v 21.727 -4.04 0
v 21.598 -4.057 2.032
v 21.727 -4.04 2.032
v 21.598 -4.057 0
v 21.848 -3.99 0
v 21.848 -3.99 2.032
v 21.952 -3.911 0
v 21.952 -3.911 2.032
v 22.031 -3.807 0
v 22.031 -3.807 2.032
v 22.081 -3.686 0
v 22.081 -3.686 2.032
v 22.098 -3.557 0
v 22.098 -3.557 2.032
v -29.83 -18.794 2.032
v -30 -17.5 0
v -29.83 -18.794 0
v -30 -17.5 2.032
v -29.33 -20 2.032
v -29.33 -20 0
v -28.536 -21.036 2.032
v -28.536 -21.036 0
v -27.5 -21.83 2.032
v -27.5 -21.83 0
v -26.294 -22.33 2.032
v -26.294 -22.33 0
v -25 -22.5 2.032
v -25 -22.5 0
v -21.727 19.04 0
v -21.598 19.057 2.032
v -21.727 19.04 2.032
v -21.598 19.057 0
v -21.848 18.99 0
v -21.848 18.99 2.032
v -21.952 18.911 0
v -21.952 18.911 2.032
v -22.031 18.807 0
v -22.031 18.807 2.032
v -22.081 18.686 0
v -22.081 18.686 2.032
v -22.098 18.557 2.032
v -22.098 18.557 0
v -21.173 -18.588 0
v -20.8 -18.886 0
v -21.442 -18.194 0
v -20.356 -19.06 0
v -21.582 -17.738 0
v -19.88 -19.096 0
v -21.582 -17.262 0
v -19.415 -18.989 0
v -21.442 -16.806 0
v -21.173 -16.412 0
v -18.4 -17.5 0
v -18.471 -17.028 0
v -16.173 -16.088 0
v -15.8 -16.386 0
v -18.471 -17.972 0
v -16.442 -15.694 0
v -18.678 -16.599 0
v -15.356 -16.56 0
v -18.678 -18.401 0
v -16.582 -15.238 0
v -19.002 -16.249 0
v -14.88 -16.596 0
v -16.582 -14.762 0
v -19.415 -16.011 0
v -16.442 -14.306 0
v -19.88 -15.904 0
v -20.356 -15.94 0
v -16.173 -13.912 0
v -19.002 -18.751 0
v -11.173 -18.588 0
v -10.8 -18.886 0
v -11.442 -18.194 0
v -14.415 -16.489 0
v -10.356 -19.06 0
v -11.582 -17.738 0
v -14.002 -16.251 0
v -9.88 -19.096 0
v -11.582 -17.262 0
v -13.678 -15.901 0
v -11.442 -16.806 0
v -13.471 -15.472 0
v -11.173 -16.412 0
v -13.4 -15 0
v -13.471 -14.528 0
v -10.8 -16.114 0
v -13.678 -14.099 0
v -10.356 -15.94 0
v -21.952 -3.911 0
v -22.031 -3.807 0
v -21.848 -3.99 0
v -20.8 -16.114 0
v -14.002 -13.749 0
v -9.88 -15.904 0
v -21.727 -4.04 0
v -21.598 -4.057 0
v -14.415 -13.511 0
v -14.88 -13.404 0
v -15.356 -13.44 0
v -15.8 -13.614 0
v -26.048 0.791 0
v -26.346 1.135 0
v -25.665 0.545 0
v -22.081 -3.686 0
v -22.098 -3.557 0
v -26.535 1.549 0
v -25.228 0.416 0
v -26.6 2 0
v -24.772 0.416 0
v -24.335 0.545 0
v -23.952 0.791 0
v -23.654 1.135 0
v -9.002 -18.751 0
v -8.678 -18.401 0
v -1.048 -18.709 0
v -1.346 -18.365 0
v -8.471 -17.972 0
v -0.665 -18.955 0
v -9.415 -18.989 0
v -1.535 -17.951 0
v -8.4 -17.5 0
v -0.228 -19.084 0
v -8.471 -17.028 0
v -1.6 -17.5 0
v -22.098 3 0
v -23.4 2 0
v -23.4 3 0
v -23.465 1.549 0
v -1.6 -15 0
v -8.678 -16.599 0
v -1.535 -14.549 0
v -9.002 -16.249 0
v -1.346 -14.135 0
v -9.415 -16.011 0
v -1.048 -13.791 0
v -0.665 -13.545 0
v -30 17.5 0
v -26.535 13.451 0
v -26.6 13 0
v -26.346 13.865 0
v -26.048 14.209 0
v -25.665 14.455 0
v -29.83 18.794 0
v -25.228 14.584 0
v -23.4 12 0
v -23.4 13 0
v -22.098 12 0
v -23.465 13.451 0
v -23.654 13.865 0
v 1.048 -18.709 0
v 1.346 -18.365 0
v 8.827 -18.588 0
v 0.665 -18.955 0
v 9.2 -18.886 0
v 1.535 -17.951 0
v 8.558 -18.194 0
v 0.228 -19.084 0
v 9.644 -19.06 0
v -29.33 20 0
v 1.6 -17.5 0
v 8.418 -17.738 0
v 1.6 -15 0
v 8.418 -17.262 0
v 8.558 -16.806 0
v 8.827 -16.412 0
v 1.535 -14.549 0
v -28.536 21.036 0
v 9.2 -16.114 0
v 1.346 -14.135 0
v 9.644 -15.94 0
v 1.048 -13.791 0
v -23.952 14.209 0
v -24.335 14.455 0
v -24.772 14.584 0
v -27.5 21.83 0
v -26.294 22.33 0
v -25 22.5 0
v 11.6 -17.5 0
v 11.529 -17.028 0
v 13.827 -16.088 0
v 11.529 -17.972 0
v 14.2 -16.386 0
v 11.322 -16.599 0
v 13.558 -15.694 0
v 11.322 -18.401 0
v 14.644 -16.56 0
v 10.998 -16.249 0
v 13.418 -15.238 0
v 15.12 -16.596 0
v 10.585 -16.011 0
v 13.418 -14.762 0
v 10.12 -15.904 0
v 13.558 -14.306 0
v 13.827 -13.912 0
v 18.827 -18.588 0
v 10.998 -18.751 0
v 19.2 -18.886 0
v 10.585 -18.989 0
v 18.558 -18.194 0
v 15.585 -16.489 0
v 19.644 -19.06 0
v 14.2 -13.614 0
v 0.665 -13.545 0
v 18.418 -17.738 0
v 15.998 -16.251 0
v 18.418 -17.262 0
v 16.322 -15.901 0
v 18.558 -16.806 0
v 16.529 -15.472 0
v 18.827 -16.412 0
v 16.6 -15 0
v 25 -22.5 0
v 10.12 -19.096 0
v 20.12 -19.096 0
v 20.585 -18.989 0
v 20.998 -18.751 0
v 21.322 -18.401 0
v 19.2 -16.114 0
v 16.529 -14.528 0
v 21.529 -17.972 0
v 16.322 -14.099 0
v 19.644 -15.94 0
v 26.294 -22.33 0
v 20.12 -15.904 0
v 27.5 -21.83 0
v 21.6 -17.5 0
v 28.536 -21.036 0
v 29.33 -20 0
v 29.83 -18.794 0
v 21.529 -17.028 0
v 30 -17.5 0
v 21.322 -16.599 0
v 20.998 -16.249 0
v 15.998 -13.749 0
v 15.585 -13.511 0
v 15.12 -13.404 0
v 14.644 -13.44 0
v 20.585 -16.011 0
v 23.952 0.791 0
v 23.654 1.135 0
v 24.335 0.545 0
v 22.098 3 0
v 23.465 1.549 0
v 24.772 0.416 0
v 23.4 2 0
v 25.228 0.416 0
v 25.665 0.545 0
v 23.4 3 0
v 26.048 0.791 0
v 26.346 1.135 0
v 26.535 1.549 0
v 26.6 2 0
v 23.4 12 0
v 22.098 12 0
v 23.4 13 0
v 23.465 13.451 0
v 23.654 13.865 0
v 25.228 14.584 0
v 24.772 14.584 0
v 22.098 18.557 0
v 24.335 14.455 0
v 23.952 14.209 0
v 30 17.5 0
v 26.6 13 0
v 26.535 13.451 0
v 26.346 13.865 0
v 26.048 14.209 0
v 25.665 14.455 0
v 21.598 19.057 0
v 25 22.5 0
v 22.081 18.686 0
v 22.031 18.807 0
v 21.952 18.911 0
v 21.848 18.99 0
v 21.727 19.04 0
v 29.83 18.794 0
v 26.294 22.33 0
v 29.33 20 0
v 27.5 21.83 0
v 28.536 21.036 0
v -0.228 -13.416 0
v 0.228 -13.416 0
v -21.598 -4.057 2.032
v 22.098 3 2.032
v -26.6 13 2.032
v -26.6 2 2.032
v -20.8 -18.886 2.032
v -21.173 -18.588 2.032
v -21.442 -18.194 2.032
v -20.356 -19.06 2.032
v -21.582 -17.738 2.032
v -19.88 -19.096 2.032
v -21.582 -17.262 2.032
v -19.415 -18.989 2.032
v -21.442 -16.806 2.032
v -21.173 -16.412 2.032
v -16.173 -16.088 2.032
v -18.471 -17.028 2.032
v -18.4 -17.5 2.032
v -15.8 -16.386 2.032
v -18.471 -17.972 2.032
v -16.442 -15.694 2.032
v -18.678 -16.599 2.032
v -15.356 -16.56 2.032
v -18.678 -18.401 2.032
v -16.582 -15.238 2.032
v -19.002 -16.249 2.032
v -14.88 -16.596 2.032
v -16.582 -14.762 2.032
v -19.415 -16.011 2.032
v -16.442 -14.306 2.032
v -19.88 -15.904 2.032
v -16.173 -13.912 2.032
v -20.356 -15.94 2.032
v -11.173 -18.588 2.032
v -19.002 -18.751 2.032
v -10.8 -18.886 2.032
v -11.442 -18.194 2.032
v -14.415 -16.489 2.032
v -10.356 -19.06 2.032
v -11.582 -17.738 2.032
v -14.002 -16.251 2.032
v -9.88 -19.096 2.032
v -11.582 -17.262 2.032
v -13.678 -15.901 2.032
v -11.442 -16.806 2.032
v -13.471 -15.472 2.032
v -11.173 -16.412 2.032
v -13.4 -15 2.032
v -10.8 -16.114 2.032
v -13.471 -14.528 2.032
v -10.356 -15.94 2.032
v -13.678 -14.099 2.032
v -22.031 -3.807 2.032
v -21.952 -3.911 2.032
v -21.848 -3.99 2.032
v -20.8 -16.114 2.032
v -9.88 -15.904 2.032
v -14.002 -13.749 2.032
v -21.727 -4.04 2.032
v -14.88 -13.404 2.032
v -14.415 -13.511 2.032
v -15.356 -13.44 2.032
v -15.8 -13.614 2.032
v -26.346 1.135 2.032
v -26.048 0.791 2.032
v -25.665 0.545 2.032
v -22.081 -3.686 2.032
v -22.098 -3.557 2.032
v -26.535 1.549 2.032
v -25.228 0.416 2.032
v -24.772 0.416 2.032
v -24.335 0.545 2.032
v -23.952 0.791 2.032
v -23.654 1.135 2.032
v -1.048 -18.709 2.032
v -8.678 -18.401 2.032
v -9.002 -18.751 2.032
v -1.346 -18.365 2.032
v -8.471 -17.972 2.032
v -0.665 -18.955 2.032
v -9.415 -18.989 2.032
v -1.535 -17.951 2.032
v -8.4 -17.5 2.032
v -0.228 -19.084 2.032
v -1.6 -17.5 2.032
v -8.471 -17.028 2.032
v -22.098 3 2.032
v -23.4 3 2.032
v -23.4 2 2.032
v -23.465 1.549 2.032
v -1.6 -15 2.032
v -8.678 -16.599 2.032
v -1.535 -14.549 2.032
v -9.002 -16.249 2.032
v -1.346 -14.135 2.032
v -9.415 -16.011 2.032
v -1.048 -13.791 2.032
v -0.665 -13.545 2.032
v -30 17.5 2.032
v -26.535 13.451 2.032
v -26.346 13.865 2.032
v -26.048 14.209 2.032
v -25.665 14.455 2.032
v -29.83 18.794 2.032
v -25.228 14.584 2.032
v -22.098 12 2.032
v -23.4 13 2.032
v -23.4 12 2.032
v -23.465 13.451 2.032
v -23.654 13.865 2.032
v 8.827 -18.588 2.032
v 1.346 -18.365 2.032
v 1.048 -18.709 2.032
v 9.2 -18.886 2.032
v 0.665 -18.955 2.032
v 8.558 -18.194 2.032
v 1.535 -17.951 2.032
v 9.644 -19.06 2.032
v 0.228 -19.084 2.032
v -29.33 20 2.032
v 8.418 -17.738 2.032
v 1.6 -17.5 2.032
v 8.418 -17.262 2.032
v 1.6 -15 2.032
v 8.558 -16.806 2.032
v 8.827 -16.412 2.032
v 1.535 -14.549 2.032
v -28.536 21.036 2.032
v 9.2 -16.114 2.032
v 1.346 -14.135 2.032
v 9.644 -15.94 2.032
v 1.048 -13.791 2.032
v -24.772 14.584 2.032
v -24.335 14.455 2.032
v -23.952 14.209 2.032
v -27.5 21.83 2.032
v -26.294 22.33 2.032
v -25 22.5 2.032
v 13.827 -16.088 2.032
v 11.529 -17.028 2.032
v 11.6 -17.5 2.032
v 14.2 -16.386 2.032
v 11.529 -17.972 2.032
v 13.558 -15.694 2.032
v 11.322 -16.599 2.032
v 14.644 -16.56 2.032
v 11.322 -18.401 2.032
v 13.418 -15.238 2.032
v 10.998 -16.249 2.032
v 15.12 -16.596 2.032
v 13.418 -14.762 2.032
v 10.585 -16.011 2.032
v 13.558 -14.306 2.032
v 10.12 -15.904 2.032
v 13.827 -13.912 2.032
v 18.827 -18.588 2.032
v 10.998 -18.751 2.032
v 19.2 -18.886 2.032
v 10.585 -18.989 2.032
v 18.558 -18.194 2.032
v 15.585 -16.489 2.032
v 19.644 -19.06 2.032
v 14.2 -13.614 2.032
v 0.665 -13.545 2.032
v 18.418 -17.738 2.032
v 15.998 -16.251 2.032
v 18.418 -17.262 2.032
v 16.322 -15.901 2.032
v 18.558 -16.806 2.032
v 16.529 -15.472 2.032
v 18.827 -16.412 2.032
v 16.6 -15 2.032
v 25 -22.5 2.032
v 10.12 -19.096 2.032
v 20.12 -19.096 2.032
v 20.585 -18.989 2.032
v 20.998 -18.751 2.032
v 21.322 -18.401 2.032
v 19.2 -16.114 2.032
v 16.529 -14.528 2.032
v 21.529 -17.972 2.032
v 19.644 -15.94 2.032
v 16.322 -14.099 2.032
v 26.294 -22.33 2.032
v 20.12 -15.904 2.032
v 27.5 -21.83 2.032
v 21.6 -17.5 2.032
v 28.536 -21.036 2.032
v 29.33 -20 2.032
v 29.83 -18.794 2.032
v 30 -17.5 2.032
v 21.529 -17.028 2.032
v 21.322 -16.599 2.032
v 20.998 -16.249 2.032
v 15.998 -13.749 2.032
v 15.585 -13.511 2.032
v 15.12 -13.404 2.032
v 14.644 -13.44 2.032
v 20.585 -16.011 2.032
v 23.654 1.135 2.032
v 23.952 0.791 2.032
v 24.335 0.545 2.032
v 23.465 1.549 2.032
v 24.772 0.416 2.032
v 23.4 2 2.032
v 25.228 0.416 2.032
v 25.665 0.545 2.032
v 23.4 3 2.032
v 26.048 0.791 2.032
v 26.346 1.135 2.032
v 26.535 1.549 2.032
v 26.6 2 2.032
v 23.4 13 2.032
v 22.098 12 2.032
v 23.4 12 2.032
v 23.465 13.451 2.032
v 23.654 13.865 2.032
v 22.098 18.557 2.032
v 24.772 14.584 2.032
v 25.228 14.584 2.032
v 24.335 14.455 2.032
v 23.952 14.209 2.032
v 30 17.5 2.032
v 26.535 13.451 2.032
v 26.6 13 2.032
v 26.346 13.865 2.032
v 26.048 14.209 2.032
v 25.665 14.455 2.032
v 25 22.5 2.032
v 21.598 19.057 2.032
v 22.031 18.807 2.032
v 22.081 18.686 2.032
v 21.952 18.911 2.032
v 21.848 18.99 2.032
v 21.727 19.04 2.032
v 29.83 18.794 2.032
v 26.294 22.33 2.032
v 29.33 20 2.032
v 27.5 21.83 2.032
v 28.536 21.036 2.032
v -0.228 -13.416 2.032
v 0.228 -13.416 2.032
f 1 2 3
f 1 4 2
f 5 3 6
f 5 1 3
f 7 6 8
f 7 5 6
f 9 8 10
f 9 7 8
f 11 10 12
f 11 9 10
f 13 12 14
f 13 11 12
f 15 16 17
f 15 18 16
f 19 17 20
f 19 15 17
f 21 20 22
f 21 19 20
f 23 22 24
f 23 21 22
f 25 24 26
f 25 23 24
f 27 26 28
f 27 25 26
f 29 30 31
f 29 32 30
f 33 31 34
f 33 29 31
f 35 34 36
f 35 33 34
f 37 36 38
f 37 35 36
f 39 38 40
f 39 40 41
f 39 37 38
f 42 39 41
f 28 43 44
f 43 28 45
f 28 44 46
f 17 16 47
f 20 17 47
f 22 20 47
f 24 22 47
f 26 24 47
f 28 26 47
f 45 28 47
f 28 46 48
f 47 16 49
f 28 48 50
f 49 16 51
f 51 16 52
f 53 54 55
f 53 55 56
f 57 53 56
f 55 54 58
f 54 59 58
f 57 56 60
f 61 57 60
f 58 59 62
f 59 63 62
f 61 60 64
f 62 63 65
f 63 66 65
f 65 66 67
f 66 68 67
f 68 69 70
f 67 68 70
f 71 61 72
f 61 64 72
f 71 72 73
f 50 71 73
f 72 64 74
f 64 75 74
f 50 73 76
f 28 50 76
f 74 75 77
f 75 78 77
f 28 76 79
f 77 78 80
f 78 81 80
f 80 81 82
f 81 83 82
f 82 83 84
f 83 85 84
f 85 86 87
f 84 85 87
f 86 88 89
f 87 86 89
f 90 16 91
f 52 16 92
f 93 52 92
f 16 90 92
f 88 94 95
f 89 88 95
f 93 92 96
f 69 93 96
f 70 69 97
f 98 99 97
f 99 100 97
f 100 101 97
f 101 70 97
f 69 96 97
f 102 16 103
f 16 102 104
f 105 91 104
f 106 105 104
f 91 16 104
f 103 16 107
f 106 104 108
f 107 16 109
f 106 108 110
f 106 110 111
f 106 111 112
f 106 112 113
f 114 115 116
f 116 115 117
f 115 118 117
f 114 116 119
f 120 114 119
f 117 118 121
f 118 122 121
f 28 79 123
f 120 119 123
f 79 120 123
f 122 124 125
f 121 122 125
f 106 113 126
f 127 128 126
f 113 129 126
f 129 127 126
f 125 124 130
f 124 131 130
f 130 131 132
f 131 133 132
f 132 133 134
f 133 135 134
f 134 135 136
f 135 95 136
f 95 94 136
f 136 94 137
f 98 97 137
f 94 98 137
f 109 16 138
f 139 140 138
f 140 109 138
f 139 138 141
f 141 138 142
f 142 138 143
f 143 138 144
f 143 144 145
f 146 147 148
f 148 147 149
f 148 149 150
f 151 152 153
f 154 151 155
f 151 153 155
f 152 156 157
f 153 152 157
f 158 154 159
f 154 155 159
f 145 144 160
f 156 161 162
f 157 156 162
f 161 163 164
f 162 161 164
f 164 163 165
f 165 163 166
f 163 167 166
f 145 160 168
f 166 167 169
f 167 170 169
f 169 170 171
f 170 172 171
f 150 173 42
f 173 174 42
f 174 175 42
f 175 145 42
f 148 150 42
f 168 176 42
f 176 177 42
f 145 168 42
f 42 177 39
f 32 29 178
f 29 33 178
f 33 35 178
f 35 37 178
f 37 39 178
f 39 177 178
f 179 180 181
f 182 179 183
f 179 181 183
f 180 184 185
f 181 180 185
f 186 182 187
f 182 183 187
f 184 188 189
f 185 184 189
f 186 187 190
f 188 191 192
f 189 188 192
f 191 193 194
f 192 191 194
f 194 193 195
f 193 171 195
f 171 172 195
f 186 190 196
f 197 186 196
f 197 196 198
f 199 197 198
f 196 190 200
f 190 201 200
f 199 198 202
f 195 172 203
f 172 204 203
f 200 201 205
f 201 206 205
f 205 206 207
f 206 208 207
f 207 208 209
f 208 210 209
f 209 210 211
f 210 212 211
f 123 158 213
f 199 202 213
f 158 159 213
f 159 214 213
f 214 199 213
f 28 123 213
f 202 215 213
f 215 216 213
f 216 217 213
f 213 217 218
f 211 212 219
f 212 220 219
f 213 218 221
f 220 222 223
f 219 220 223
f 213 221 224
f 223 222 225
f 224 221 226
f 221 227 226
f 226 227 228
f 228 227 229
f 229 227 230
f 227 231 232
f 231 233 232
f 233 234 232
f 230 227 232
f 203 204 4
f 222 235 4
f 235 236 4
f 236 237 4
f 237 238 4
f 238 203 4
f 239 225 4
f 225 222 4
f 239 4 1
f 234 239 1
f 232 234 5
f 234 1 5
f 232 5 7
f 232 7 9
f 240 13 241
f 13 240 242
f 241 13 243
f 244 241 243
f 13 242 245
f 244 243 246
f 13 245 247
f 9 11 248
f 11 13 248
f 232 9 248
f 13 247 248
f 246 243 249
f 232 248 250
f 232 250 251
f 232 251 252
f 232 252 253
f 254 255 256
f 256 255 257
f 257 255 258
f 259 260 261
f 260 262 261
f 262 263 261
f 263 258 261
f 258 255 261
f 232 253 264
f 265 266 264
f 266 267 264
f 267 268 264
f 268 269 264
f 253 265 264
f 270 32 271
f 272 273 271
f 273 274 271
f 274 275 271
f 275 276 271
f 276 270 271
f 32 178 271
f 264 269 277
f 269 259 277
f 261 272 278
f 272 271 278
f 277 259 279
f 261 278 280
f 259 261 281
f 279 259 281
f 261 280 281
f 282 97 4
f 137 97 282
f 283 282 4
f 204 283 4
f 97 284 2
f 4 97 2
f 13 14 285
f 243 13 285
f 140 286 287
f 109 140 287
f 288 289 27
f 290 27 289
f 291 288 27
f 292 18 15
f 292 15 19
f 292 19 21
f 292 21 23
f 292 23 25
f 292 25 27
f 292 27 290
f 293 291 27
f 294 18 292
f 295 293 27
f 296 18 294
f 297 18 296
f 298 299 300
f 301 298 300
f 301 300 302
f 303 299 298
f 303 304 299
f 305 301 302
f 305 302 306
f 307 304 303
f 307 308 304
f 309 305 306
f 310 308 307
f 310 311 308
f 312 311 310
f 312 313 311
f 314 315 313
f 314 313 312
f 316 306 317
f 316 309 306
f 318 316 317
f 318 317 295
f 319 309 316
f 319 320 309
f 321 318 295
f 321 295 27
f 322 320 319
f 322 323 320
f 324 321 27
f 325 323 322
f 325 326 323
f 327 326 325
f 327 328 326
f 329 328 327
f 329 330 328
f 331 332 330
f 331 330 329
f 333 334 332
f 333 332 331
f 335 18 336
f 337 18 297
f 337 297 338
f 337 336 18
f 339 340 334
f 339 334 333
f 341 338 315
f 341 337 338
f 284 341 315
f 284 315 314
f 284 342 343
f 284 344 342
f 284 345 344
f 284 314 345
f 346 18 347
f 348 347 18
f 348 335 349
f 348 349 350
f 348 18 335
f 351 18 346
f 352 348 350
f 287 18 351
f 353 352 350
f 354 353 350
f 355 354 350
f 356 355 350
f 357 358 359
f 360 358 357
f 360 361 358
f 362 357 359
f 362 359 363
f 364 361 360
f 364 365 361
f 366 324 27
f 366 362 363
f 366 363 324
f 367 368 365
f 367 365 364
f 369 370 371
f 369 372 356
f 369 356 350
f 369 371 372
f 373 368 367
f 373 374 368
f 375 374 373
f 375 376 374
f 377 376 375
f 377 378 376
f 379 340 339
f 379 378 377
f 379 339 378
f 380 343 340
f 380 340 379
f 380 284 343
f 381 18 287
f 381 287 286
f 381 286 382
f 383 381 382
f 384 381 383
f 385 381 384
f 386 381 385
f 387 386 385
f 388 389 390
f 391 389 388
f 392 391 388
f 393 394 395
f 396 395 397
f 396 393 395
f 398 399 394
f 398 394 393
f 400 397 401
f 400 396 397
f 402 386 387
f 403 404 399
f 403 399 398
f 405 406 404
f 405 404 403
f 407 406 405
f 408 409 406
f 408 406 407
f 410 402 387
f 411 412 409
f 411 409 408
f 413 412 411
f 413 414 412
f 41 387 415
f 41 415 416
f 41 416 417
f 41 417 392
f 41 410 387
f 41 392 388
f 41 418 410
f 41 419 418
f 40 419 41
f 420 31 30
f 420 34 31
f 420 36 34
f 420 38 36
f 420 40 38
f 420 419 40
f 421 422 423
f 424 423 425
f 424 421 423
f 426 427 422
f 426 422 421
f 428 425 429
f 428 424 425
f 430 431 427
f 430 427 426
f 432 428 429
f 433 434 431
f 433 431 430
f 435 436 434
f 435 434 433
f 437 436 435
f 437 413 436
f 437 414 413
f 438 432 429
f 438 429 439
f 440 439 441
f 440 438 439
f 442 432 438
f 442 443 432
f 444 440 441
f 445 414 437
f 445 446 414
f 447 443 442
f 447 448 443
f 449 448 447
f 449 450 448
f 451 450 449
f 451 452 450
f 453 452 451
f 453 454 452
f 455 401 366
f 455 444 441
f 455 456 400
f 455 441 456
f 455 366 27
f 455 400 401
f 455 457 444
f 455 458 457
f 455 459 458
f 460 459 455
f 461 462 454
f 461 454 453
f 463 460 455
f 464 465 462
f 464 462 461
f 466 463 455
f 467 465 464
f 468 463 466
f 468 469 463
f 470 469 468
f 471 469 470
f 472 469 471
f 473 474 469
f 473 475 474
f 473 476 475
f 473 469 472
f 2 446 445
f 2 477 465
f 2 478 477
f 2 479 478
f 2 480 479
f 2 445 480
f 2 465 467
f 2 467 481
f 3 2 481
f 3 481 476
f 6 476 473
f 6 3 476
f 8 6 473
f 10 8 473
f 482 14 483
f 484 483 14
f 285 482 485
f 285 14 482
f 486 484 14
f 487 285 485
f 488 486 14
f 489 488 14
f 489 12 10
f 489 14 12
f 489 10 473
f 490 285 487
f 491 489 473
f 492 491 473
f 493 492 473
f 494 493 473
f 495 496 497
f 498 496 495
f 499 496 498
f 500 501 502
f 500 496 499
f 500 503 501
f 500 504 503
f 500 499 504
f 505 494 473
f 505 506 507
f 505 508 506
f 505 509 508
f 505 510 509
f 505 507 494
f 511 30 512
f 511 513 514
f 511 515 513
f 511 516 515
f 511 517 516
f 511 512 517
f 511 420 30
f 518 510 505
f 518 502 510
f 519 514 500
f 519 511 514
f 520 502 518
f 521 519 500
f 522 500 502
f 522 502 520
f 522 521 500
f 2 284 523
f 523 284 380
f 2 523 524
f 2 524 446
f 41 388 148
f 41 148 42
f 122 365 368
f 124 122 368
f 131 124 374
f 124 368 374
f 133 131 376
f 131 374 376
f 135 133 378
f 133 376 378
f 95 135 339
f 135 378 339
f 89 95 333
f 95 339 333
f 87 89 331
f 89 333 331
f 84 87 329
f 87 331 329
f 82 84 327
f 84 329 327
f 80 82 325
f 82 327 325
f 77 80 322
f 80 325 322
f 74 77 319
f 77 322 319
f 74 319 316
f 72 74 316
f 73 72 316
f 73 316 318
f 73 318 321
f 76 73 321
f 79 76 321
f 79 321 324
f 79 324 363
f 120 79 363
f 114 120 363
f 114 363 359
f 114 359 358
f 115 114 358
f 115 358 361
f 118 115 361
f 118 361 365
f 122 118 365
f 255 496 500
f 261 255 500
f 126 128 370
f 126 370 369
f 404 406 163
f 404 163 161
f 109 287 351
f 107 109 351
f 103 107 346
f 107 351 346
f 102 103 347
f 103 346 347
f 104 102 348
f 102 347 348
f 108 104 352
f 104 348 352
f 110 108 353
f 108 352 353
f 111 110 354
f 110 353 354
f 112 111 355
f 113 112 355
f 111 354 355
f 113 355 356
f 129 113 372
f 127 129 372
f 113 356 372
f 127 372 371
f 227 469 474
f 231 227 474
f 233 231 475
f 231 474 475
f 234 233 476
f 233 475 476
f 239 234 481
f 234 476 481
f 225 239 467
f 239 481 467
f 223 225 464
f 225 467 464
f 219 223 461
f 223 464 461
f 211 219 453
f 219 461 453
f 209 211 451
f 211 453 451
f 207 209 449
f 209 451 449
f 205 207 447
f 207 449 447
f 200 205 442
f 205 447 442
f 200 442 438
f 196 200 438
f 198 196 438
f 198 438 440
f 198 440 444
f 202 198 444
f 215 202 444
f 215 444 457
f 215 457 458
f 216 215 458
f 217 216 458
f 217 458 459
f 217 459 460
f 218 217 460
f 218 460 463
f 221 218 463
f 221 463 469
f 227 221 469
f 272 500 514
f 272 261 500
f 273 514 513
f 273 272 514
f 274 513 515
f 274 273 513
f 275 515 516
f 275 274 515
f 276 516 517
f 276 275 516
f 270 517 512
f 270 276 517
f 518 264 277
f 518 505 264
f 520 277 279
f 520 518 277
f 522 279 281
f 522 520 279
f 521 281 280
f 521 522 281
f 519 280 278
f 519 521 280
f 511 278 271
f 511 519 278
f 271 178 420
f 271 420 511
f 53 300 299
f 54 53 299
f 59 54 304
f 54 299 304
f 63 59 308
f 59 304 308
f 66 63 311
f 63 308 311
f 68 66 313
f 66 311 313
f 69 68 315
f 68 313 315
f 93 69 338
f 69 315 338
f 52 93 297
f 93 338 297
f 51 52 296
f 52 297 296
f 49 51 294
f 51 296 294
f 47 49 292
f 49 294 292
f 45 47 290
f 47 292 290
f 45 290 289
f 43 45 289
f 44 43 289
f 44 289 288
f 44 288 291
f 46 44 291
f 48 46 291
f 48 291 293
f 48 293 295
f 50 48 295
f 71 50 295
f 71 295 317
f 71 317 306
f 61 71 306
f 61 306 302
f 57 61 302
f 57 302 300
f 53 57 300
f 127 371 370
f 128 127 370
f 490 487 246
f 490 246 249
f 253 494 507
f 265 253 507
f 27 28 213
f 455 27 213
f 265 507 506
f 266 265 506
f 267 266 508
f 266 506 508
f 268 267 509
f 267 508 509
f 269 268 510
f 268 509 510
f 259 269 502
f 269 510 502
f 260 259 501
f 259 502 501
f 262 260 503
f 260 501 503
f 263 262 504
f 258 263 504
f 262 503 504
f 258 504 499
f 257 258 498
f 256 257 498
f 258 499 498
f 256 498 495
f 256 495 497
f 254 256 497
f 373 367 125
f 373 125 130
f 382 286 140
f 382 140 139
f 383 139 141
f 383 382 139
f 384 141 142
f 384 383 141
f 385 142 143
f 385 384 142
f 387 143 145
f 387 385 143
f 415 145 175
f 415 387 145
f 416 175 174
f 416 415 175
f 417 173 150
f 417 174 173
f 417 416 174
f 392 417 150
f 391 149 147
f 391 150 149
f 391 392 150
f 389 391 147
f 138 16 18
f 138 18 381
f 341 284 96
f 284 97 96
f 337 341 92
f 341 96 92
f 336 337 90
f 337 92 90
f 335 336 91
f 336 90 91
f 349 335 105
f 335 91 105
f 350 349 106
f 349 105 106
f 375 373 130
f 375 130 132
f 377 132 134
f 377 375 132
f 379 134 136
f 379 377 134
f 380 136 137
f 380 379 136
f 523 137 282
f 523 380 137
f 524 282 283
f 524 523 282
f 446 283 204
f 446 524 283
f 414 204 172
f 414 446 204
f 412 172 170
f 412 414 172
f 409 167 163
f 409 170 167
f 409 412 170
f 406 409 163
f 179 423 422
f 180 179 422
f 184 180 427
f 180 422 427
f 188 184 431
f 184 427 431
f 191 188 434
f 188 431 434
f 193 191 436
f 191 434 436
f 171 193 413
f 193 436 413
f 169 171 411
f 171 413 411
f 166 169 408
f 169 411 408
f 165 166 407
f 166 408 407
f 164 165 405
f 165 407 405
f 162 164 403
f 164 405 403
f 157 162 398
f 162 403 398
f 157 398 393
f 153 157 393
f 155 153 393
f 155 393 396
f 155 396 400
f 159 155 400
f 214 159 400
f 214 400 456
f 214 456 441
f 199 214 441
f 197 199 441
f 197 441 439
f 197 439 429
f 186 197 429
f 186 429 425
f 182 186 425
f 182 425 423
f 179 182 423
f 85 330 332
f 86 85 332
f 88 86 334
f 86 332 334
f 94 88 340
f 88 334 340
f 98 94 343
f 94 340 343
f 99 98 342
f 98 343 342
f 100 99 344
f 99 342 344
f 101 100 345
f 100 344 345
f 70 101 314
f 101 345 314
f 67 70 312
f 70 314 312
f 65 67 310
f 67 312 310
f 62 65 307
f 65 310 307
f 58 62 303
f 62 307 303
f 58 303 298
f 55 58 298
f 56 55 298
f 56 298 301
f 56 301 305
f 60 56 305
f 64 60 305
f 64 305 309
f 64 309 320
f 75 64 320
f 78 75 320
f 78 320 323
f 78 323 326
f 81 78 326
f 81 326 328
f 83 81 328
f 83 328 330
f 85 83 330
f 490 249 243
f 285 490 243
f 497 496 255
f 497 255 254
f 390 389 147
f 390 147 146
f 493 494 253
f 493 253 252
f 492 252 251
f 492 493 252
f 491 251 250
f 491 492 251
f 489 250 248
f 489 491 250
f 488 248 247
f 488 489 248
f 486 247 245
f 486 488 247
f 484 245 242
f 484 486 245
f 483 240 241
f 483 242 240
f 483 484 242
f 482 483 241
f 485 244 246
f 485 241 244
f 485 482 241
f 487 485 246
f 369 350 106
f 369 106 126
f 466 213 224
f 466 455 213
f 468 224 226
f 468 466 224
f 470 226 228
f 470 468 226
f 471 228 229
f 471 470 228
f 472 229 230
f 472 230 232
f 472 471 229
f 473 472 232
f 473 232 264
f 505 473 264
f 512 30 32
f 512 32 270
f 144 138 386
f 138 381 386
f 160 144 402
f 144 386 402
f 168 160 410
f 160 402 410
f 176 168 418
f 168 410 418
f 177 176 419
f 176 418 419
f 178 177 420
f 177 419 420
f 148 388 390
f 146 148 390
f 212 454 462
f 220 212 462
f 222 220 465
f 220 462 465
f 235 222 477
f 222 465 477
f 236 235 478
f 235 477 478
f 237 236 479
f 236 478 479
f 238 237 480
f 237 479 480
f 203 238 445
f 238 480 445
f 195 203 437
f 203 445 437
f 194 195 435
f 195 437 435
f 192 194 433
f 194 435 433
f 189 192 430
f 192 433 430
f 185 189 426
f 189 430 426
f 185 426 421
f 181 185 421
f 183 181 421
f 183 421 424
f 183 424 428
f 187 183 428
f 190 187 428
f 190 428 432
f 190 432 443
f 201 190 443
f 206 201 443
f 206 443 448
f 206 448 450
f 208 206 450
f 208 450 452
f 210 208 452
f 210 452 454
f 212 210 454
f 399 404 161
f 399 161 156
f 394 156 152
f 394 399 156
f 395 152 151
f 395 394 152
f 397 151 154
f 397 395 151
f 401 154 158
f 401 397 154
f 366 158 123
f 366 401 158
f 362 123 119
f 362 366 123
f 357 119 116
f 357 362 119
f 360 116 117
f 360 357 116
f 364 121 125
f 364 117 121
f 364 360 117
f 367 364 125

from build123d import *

# Parameters (mm, degrees)
SKETCH1_W           = 60
SKETCH1_H           = 45
BOSS_EXTRUDE1_DEPTH = 2.032
FILLET1_R           = 5
SKETCH2_W           = 44.196
SKETCH2_H           = 23.114
CUT_EXTRUDE1_DEPTH  = 3.032
FILLET2_R           = 0.5
CUT_EXTRUDE2_DEPTH  = 3.032
SKETCH4_R           = 1.6
CUT_EXTRUDE3_DEPTH  = 3.032


with BuildPart() as part:
    # Sketch1 → Boss-Extrude1 (new body)
    with BuildSketch(Plane.XY):
        Rectangle(SKETCH1_W, SKETCH1_H)
    extrude(amount=BOSS_EXTRUDE1_DEPTH)

    # Fillet1
    fillet1_edges = [part.edges().sort_by_distance(p)[0] for p in [
        (30, -22.5, 1.016),
        (-30, -22.5, 1.016),
        (-30, 22.5, 1.016),
        (30, 22.5, 1.016),
    ]]
    fillet(fillet1_edges, radius=FILLET1_R)

    # Sketch2 → Cut-Extrude1 (cut, through all)
    with BuildSketch(Plane.XY.offset(2.032)):
        with Locations((0, 7.5)):
            Rectangle(SKETCH2_W, SKETCH2_H)
    extrude(amount=-CUT_EXTRUDE1_DEPTH, mode=Mode.SUBTRACT)

    # Fillet2
    fillet2_edges = [part.edges().sort_by_distance(p)[0] for p in [
        (22.098, 19.057, 1.016),
        (22.098, -4.057, 1.016),
        (-22.098, -4.057, 1.016),
        (-22.098, 19.057, 1.016),
    ]]
    fillet(fillet2_edges, radius=FILLET2_R)

    # Sketch3 → Cut-Extrude2 (cut, through all)
    with BuildSketch(Plane.XY.offset(2.032)):
        with BuildLine():
            ThreePointArc((-26.6, 13), (-25, 14.6), (-23.4, 13))
            Line((-23.4, 13), (-23.4, 12))
            ThreePointArc((-23.4, 12), (-25, 10.4), (-26.6, 12))
            Line((-26.6, 12), (-26.6, 13))
        make_face()
        with BuildLine():
            ThreePointArc((-26.6, 3), (-25, 4.6), (-23.4, 3))
            Line((-23.4, 3), (-22.098, 3))
            Line((-22.098, 3), (-22.098, 12))
            Line((-22.098, 12), (-23.4, 12))
            ThreePointArc((-23.4, 12), (-25, 10.4), (-26.6, 12))
            Line((-26.6, 12), (-26.6, 3))
        make_face()
        with BuildLine():
            Line((-26.6, 3), (-26.6, 2))
            ThreePointArc((-26.6, 2), (-25, 0.4), (-23.4, 2))
            Line((-23.4, 2), (-23.4, 3))
            ThreePointArc((-23.4, 3), (-25, 4.6), (-26.6, 3))
        make_face()
        with BuildLine():
            ThreePointArc((26.6, 2), (25, 0.4), (23.4, 2))
            Line((23.4, 2), (23.4, 3))
            ThreePointArc((23.4, 3), (25, 4.6), (26.6, 3))
            Line((26.6, 3), (26.6, 2))
        make_face()
        with BuildLine():
            ThreePointArc((23.4, 12), (25, 10.4), (26.6, 12))
            Line((26.6, 12), (26.6, 3))
            ThreePointArc((26.6, 3), (25, 4.6), (23.4, 3))
            Line((23.4, 3), (20.842092025, 3))
            Line((20.842092025, 3), (20.842092025, 12))
            Line((20.842092025, 12), (23.4, 12))
        make_face()
        with BuildLine():
            Line((26.6, 12), (26.6, 13))
            ThreePointArc((26.6, 13), (25, 14.6), (23.4, 13))
            Line((23.4, 13), (23.4, 12))
            ThreePointArc((23.4, 12), (25, 10.4), (26.6, 12))
        make_face()
    extrude(amount=-CUT_EXTRUDE2_DEPTH, mode=Mode.SUBTRACT)

    # Sketch4 → Cut-Extrude3 (cut, through all)
    with BuildSketch(Plane.XY.offset(2.032)):
        with Locations((-15, -15)):
            Circle(SKETCH4_R)
        with Locations((15, -15)):
            Circle(SKETCH4_R)
        with Locations((10, -17.5)):
            Circle(SKETCH4_R)
        with Locations((-10, -17.5)):
            Circle(SKETCH4_R)
        with Locations((20, -17.5)):
            Circle(SKETCH4_R)
        with Locations((-20, -17.5)):
            Circle(SKETCH4_R)
        with BuildLine():
            Line((1.6, -15), (1.6, -17.5))
            ThreePointArc((1.6, -17.5), (0, -19.1), (-1.6, -17.5))
            Line((-1.6, -17.5), (-1.6, -15))
            ThreePointArc((-1.6, -15), (0, -13.4), (1.6, -15))
        make_face()
    extrude(amount=-CUT_EXTRUDE3_DEPTH, mode=Mode.SUBTRACT)


solid = part.part
